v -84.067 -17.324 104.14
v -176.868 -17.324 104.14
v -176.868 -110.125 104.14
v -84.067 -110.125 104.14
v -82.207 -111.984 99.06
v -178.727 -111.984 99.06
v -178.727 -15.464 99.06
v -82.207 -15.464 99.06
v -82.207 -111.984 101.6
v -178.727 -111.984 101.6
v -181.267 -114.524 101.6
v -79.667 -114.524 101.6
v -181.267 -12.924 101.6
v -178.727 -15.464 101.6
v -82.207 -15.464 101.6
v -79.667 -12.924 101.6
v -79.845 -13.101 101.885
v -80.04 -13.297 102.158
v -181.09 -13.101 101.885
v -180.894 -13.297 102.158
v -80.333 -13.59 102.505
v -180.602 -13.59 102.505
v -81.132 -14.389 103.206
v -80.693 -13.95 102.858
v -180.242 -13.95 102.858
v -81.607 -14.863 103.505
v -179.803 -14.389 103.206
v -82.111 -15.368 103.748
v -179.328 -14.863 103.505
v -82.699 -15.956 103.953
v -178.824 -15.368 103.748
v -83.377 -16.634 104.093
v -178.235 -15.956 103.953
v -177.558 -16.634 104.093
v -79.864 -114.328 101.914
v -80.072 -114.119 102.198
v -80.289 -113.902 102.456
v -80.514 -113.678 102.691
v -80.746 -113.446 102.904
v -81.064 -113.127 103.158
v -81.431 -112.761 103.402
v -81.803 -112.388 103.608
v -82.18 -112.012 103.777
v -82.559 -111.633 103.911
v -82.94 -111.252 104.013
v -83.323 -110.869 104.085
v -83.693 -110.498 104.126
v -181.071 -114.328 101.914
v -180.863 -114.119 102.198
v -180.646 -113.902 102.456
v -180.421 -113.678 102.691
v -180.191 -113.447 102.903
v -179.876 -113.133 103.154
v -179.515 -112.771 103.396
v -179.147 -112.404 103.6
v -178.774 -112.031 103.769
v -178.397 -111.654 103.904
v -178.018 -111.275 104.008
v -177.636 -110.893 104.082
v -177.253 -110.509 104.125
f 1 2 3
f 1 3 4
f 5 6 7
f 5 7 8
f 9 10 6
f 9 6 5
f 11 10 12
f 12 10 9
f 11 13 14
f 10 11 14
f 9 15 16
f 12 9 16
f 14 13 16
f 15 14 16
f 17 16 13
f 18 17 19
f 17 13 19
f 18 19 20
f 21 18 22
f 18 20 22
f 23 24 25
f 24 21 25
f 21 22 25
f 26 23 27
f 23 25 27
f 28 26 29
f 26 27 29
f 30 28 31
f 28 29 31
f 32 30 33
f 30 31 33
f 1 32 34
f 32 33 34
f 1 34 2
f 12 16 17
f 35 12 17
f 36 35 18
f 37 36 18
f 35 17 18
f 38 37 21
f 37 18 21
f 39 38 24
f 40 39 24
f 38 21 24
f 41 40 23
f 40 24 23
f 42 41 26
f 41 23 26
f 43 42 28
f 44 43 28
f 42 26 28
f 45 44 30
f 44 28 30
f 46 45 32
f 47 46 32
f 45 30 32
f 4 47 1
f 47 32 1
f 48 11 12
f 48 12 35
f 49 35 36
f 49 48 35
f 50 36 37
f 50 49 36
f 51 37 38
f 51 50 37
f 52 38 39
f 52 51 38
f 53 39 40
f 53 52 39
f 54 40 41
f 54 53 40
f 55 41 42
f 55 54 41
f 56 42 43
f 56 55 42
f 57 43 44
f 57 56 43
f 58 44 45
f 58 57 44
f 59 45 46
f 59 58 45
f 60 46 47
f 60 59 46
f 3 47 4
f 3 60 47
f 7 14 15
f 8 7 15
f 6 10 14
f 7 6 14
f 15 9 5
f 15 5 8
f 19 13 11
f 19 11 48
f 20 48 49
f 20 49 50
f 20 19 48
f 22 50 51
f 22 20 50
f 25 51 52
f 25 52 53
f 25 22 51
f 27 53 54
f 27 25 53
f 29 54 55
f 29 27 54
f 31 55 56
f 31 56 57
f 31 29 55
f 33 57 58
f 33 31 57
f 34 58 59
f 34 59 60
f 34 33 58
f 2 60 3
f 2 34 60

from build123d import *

# Parameters (mm, degrees)
F1_W        = 101.6
F1_H        = 101.6
F1_W_2      = 96.52
F1_H_2      = 96.52
F2_DEPTH    = 2.54
F3_T1_DEPTH = 123.5970452561
F3_T3_DEPTH = 123.5970452561
F4_DEPTH    = 2.54


# Not quite as in the source:
# - a fillet or chamfer that OpenCascade refuses, or shapes differently, is made with other operations: its cross-section is extruded or revolved along the edge and cut away or added


with BuildPart() as f2:
    # F1 (on offset) → F2 (new body)
    with BuildSketch(Plane.XY.offset(101.6)):
        with Locations((-130.4673959928, -63.7241914409)):
            Rectangle(F1_W, F1_H)
        with Locations((-130.4673959928, -63.7241914409)):
            Rectangle(F1_W_2, F1_H_2, mode=Mode.SUBTRACT)
        with Locations((-130.4673959928, -63.7241914409)):
            Rectangle(F1_W_2, F1_H_2)
    extrude(amount=F2_DEPTH)

    # F3: fillet of radius 5.08 on 4 edges, made by hand

    # F3_s2 → F3_t1 (cut)
    with BuildSketch(Plane.YZ.offset(-192.2659186209)):
        with BuildLine():
            ThreePointArc((-114.5241914409, 101.6), (-112.6647823896, 103.4594090512), (-110.1247823896, 104.14))
            Line((-110.1247823896, 104.14), (-114.5241914409, 104.14))
            Line((-114.5241914409, 104.14), (-114.5241914409, 101.6))
        make_face()
        with BuildLine():
            ThreePointArc((-12.9241914409, 101.6), (-14.7836004921, 103.4594090512), (-17.3236004921, 104.14))
            Line((-17.3236004921, 104.14), (-12.9241914409, 104.14))
            Line((-12.9241914409, 104.14), (-12.9241914409, 101.6))
        make_face()
    extrude(amount=F3_T1_DEPTH, mode=Mode.SUBTRACT)

    # F3_s4 → F3_t3 (cut)
    with BuildSketch(Plane.XZ.offset(1.9256688128)):
        with BuildLine():
            ThreePointArc((-79.6673959928, 101.6), (-81.526805044, 103.4594090512), (-84.066805044, 104.14))
            Line((-84.066805044, 104.14), (-79.6673959928, 104.14))
            Line((-79.6673959928, 104.14), (-79.6673959928, 101.6))
        make_face()
        with BuildLine():
            ThreePointArc((-181.2673959928, 101.6), (-179.4079869416, 103.4594090512), (-176.8679869416, 104.14))
            Line((-176.8679869416, 104.14), (-181.2673959928, 104.14))
            Line((-181.2673959928, 104.14), (-181.2673959928, 101.6))
        make_face()
    extrude(amount=F3_T3_DEPTH, mode=Mode.SUBTRACT)

    # F1 (on offset) → F4 (join)
    with BuildSketch(Plane.XY.offset(101.6)):
        with Locations((-130.4673959928, -63.7241914409)):
            Rectangle(F1_W_2, F1_H_2)
    extrude(amount=-F4_DEPTH)


solid = f2.part
